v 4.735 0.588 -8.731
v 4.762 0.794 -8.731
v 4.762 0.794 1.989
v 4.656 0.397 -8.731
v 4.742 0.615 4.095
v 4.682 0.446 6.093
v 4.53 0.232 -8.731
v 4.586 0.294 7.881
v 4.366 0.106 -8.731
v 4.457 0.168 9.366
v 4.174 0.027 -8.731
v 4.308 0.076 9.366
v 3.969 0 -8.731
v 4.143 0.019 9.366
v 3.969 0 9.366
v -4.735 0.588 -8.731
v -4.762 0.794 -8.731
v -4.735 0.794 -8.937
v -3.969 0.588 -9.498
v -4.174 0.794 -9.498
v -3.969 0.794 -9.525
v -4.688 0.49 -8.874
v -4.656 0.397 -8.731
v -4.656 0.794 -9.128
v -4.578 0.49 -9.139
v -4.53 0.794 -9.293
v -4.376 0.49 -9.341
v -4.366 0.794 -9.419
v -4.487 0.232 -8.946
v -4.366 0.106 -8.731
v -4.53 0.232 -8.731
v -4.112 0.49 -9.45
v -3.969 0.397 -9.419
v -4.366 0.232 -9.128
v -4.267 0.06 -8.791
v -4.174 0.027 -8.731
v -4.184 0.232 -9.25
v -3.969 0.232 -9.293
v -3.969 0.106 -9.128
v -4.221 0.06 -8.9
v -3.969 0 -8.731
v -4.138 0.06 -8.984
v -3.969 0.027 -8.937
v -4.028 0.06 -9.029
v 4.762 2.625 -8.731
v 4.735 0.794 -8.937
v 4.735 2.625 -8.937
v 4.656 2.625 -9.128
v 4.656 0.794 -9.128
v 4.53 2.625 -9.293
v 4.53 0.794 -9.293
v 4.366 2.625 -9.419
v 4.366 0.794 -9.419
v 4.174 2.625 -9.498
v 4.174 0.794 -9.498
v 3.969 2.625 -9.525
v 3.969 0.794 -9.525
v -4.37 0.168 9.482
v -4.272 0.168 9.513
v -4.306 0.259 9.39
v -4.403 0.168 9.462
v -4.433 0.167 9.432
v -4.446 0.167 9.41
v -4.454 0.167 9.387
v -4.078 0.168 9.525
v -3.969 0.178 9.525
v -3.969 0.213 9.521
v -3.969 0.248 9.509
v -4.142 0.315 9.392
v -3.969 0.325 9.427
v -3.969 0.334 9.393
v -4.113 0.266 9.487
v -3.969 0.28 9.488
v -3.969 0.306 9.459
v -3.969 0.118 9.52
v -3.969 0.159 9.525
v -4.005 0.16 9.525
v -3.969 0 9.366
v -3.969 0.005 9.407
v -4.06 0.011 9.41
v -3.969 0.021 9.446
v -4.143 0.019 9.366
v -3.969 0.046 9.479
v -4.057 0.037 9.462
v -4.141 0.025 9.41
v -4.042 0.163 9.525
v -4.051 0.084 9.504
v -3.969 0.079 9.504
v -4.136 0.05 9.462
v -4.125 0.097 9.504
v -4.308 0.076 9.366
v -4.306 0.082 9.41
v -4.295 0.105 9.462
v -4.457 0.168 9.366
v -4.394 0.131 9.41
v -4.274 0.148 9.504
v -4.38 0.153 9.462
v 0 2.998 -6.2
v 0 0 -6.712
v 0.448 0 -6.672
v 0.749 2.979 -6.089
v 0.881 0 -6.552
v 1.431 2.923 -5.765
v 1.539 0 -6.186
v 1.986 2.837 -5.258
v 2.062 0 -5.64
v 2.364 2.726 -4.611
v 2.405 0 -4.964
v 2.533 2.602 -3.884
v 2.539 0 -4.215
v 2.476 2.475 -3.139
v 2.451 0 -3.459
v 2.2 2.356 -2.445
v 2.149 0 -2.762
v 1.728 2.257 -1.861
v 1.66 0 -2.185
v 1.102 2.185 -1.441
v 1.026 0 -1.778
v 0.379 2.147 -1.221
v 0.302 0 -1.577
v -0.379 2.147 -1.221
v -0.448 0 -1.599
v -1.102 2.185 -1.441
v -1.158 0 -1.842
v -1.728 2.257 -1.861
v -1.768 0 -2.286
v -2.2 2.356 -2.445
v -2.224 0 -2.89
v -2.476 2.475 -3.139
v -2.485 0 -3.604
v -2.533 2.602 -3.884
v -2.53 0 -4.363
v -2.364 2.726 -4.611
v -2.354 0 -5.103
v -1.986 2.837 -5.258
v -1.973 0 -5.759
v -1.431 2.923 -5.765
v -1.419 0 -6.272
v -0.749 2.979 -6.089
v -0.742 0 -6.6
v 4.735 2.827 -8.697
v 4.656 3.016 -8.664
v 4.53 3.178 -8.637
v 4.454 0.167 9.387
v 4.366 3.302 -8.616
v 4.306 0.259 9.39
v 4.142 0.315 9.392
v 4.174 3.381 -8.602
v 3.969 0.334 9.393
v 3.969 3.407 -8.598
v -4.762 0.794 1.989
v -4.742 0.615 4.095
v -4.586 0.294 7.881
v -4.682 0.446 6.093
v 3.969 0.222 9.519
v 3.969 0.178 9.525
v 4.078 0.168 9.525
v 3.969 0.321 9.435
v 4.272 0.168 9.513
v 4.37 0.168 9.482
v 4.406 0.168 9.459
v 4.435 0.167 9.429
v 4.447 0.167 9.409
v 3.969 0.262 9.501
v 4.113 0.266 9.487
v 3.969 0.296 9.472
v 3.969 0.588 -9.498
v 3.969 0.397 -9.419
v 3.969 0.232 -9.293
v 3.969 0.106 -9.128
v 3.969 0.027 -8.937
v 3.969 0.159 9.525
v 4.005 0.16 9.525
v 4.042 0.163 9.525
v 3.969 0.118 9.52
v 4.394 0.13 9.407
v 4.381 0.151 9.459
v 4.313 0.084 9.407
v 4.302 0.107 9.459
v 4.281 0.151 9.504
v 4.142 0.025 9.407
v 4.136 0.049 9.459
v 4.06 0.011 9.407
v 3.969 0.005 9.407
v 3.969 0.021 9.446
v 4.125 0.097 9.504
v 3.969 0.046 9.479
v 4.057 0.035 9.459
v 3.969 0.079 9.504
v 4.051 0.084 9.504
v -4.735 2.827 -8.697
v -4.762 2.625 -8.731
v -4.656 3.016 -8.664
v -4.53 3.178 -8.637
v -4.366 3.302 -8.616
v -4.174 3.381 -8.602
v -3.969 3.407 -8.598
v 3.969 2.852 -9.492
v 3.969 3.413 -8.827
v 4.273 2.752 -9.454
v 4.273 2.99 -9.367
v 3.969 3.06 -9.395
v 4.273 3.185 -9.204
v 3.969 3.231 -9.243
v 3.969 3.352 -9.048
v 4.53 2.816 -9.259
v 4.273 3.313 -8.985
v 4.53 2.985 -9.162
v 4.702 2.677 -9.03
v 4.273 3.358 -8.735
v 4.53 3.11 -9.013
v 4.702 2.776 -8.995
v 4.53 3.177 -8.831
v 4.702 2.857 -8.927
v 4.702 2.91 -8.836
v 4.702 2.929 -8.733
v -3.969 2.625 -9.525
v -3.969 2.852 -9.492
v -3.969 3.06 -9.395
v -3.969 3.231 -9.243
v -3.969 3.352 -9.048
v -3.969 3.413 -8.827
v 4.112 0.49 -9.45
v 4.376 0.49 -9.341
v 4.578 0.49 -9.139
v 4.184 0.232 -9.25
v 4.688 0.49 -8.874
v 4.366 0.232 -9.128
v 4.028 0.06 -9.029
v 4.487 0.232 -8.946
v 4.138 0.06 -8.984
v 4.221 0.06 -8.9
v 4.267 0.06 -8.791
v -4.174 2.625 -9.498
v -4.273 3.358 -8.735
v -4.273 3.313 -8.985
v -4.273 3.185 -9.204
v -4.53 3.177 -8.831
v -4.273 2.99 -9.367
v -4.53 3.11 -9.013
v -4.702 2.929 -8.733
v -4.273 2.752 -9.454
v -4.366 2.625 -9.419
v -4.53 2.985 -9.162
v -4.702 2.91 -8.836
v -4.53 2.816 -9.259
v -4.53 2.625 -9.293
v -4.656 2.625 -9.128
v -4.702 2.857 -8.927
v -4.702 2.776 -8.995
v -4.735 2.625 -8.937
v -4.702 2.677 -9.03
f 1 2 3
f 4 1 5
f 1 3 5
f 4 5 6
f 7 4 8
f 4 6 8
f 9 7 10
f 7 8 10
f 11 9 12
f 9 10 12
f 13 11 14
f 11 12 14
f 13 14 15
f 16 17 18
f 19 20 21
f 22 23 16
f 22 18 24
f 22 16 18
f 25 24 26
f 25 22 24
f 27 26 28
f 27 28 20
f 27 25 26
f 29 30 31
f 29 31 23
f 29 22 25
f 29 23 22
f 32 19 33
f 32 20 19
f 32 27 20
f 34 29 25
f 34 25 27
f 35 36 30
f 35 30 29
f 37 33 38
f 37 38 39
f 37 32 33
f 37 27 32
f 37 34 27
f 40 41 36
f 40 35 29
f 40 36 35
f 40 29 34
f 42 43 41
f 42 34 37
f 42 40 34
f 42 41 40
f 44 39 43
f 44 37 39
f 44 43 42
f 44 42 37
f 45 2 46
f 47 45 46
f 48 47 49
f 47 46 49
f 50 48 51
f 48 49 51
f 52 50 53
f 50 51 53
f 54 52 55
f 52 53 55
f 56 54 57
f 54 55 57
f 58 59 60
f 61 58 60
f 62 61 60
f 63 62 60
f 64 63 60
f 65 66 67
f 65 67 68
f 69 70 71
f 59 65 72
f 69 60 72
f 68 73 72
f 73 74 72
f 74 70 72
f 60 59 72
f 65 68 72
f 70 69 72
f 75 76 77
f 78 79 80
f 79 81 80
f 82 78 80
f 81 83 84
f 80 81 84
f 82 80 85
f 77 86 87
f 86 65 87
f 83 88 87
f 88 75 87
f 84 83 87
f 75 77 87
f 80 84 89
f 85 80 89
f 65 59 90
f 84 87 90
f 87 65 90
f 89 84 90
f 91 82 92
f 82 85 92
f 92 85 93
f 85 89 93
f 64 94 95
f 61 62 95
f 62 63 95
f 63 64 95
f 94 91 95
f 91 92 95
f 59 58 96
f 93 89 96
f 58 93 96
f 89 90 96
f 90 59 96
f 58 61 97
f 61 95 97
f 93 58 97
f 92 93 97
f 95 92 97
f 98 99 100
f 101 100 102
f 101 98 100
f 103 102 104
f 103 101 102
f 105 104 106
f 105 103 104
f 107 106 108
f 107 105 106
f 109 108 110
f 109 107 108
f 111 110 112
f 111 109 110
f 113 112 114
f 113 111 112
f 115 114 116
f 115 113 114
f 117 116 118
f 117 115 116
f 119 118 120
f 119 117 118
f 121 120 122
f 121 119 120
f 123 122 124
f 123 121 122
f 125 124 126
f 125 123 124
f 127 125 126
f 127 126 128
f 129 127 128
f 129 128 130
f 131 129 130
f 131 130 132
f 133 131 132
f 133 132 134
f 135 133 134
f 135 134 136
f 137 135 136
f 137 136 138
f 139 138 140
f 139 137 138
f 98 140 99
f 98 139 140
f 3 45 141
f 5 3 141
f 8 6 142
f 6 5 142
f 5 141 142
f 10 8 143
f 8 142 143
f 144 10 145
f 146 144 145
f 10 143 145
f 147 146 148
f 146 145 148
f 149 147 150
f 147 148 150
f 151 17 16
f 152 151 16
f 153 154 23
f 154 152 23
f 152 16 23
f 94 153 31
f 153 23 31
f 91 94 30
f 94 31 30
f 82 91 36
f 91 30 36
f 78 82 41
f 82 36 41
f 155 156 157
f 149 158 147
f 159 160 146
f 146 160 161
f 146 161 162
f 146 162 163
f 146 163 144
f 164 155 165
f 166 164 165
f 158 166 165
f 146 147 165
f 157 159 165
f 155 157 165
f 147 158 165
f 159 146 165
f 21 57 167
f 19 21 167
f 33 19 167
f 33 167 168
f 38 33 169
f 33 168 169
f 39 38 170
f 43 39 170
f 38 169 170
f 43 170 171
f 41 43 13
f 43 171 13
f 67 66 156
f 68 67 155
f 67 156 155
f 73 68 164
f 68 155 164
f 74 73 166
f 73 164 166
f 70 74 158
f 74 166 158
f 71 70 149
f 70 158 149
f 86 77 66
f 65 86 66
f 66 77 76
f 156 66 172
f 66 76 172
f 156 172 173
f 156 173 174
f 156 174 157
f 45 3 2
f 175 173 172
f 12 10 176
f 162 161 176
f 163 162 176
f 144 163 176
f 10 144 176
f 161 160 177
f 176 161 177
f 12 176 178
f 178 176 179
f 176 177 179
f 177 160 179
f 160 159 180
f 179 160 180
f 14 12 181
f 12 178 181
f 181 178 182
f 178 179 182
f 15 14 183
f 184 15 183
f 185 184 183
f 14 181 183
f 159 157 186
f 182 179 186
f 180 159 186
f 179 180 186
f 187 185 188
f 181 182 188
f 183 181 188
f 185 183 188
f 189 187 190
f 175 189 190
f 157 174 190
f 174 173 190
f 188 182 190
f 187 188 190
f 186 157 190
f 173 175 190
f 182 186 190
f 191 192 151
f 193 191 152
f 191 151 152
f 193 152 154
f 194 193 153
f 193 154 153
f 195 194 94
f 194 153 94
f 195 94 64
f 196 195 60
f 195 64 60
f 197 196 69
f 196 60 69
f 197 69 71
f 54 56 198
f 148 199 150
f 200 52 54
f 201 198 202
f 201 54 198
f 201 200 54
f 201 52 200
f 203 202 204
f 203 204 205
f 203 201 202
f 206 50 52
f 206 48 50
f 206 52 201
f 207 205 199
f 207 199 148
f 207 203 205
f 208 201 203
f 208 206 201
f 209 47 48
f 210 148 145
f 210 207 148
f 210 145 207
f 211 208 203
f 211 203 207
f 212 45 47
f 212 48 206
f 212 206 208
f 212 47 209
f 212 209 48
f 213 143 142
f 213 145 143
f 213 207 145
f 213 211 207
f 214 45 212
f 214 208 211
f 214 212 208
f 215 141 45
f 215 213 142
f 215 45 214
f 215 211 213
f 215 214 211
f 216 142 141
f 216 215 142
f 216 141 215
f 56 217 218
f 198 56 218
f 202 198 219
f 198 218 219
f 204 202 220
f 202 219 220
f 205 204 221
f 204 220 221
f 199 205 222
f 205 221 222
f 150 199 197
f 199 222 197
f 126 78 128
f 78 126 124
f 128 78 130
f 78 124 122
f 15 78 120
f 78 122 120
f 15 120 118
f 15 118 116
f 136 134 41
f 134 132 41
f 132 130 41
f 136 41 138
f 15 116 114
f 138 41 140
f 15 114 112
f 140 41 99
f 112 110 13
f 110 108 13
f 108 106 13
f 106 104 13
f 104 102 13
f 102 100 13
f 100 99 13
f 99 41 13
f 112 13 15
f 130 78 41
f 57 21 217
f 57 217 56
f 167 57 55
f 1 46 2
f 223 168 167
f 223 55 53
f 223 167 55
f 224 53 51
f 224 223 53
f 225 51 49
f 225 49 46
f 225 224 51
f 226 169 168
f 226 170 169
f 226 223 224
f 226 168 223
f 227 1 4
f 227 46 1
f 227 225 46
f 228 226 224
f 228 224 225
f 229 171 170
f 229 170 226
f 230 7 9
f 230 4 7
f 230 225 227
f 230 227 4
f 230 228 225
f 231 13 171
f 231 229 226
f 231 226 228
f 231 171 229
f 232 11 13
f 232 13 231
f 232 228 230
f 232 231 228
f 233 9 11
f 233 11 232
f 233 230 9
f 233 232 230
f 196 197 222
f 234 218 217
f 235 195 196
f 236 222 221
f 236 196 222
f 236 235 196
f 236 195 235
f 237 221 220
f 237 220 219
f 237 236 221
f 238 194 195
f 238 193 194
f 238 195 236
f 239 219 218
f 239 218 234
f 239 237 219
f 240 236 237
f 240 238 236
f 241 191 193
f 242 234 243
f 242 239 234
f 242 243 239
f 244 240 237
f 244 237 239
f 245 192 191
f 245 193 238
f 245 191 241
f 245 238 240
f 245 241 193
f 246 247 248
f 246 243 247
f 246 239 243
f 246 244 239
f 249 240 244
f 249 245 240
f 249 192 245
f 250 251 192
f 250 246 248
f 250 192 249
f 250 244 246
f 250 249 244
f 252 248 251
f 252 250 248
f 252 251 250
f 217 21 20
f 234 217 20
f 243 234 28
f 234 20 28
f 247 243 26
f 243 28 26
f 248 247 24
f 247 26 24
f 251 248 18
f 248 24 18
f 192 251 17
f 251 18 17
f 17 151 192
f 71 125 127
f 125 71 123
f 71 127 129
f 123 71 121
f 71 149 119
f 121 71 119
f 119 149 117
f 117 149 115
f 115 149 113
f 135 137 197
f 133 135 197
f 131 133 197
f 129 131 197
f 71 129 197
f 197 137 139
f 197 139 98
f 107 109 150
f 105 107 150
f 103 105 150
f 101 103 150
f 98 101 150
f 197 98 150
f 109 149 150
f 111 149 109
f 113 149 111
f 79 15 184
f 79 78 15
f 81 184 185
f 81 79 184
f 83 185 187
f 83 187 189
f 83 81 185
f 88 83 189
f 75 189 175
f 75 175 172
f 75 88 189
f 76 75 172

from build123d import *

# Parameters (mm, degrees)
SKETCH1_W               = 9.525
SKETCH1_H               = 19.05
BOSS_EXTRUDE1_DEPTH     = 6.35
CUT_EXTRUDE4_DEPTH      = 15.892070037
CUT_EXTRUDE4_DEPTH_BACK = 15.892070037
CUT_EXTRUDE6_DEPTH      = 11.962309672
CUT_EXTRUDE6_DEPTH_BACK = 11.962309672
SKETCH7_R               = 2.54
FILLET2_R               = 0.79375
FILLET3_R               = 0.15875


with BuildPart() as part:
    # Sketch1 → Boss-Extrude1 (new body)
    with BuildSketch(Plane(origin=(0, 0, 0), x_dir=(1, 0, 0), z_dir=(0, 1, 0))):
        Rectangle(SKETCH1_W, SKETCH1_H)
    extrude(amount=BOSS_EXTRUDE1_DEPTH)

    # Sketch4 → Cut-Extrude4 (cut, two sides: drawn at the far end of the back side and taken through both)
    with BuildSketch(Plane.ZY.offset(4.7625).offset(-CUT_EXTRUDE4_DEPTH_BACK)):
        Polygon((9.525, 0.311917294), (-9.525, 3.56560647), (-9.525, 6.35), (9.525, 6.35), align=None)
    extrude(amount=CUT_EXTRUDE4_DEPTH + CUT_EXTRUDE4_DEPTH_BACK, mode=Mode.SUBTRACT)

    # Sketch7 → Cut-Extrude6 (cut, two sides: drawn at the far end of the back side and taken through both)
    with BuildSketch(Plane(origin=(0, 1.911087398, 0.162031127), x_dir=(1, 0, 0), z_dir=(0, -0.9857256920245803, -0.16835931837193446)).offset(-CUT_EXTRUDE6_DEPTH_BACK)):
        with Locations(Location((0, -3.914374553, 0), (0, 0, 270))):
            Circle(SKETCH7_R)
    extrude(amount=CUT_EXTRUDE6_DEPTH + CUT_EXTRUDE6_DEPTH_BACK, mode=Mode.SUBTRACT)

    # Fillet2
    # the kernel refuses this fillet: 0.79375 mm, written as the material it takes off along each edge
    with BuildSketch(Plane(origin=(3.96875, 0.79375, -8.73125), x_dir=(1, 0, 0), z_dir=(0, -1, 0))) as fillet2_piece_1_section:
        Polygon((0, 0), (FILLET2_R, 0), (FILLET2_R, -FILLET2_R), (0, -FILLET2_R), align=None)
    fillet2_piece_1 = extrude(amount=FILLET2_R, mode=Mode.PRIVATE)
    fillet2_piece_1 = fillet2_piece_1 - Plane(origin=(3.96875, 0.79375, -8.73125), x_dir=(-0.7071067811865475, 0, 0.7071067811865475), z_dir=(0, -1, 0)) * Sphere(FILLET2_R, mode=Mode.PRIVATE)
    add(fillet2_piece_1, mode=Mode.SUBTRACT)
    with BuildSketch(Plane(origin=(3.96875, 2.624791783, -8.73125), x_dir=(0, 0.9857256920245803, 0.16835931837193446), z_dir=(1, 0, 0))) as fillet2_piece_2_section:
        Polygon((0, 0), (FILLET2_R, 0), (FILLET2_R, -FILLET2_R * 1.18527834653), (-FILLET2_R * 0.168359318372, -FILLET2_R * 0.985725692025), align=None)
    fillet2_piece_2 = extrude(amount=FILLET2_R, mode=Mode.PRIVATE)
    fillet2_piece_2 = fillet2_piece_2 - Plane(origin=(3.96875, 2.624791783, -8.73125), x_dir=(0, -0.7643164653374722, 0.6448413299518206), z_dir=(1, 0, 0)) * Sphere(FILLET2_R, mode=Mode.PRIVATE)
    add(fillet2_piece_2, mode=Mode.SUBTRACT)
    with BuildSketch(Plane(origin=(-3.96875, 0.79375, -8.73125), x_dir=(-1, 0, 0), z_dir=(0, -1, 0))) as fillet2_piece_3_section:
        Polygon((0, 0), (FILLET2_R, 0), (FILLET2_R, FILLET2_R), (0, FILLET2_R), align=None)
    fillet2_piece_3 = extrude(amount=FILLET2_R, mode=Mode.PRIVATE)
    fillet2_piece_3 = fillet2_piece_3 - Plane(origin=(-3.96875, 0.79375, -8.73125), x_dir=(0.7071067811865475, 0, 0.7071067811865475), z_dir=(0, -1, 0)) * Sphere(FILLET2_R, mode=Mode.PRIVATE)
    add(fillet2_piece_3, mode=Mode.SUBTRACT)
    with BuildSketch(Plane(origin=(-3.96875, 2.624791783, -8.73125), x_dir=(0, 0, -1), z_dir=(-1, 0, 0))) as fillet2_piece_4_section:
        Polygon((0, 0), (FILLET2_R, 0), (FILLET2_R, -FILLET2_R * 1.18527834653), (-FILLET2_R * 0.168359318372, -FILLET2_R * 0.985725692025), align=None)
    fillet2_piece_4 = extrude(amount=FILLET2_R, mode=Mode.PRIVATE)
    fillet2_piece_4 = fillet2_piece_4 - Plane(origin=(-3.96875, 2.624791783, -8.73125), x_dir=(0, -0.7643164653374722, 0.6448413299518206), z_dir=(-1, 0, 0)) * Sphere(FILLET2_R, mode=Mode.PRIVATE)
    add(fillet2_piece_4, mode=Mode.SUBTRACT)
    with BuildSketch(Plane(origin=(4.7625, 0, 11.509375), x_dir=(-1, 0, 0), z_dir=(0, 0, -1)), Plane(origin=(-4.7625, 0, -8.73125), x_dir=(1, 0, 0), z_dir=(0, 0, 1))) as fillet2_piece_5:
        with BuildLine():
            CenterArc((FILLET2_R, FILLET2_R), FILLET2_R, 180, 90)
            Line((0, FILLET2_R), (0, 0))
            Line((0, 0), (FILLET2_R, 0))
        make_face()
    extrude(amount=20.240625, mode=Mode.SUBTRACT)
    with BuildSketch(Plane(origin=(4.7625, 3.407211551, -8.597614791), x_dir=(0, -0.9857256920245803, -0.16835931837193446), z_dir=(0, -0.16835931837193446, 0.9857256920245803))) as fillet2_piece_6:
        with BuildLine():
            CenterArc((FILLET2_R, -FILLET2_R), FILLET2_R, 90, 90)
            Line((0, -FILLET2_R), (0, 0))
            Line((0, 0), (FILLET2_R, 0))
        make_face()
    extrude(amount=20.369423637, mode=Mode.SUBTRACT)
    with BuildSketch(Plane(origin=(3.96875, 0, -9.525), x_dir=(0, 0, 1), z_dir=(-1, 0, 0))) as fillet2_piece_7:
        with BuildLine():
            CenterArc((FILLET2_R, FILLET2_R), FILLET2_R, 180, 90)
            Line((0, FILLET2_R), (0, 0))
            Line((0, 0), (FILLET2_R, 0))
        make_face()
    extrude(amount=7.9375, mode=Mode.SUBTRACT)
    with BuildSketch(Plane(origin=(4.7625, 0.79375, -9.525), x_dir=(0, 0, 1), z_dir=(0, 1, 0))) as fillet2_piece_8:
        with BuildLine():
            CenterArc((FILLET2_R, -FILLET2_R), FILLET2_R, 90, 90)
            Line((0, -FILLET2_R), (0, 0))
            Line((0, 0), (FILLET2_R, 0))
        make_face()
    extrude(amount=1.831041783, mode=Mode.SUBTRACT)
    with BuildSketch(Plane(origin=(-3.96875, 3.56560647, -9.525), x_dir=(0, -0.16835931837193435, 0.9857256920245803), z_dir=(1, 0, 0))) as fillet2_piece_9:
        with BuildLine():
            CenterArc((FILLET2_R * 1.18527834653, FILLET2_R), FILLET2_R, 170.307559955, 99.692440045)
            Line((FILLET2_R * 0.199552654502, FILLET2_R * 1.16835931837), (0, 0))
            Line((0, 0), (FILLET2_R * 1.18527834653, 0))
        make_face()
    extrude(amount=7.9375, mode=Mode.SUBTRACT)
    with BuildSketch(Plane(origin=(-4.7625, 0.79375, -9.525), x_dir=(0, 0, 1), z_dir=(0, 1, 0))) as fillet2_piece_10:
        with BuildLine():
            CenterArc((FILLET2_R, FILLET2_R), FILLET2_R, 180, 90)
            Line((0, FILLET2_R), (0, 0))
            Line((0, 0), (FILLET2_R, 0))
        make_face()
    extrude(amount=1.831041783, mode=Mode.SUBTRACT)
    with BuildSketch(Plane(origin=(-4.7625, -0.022170729, 11.48104942), x_dir=(1, 0, 0), z_dir=(0, 0.16835931837193446, -0.9857256920245803))) as fillet2_piece_11:
        with BuildLine():
            CenterArc((FILLET2_R, FILLET2_R), FILLET2_R, 180, 90)
            Line((0, FILLET2_R), (0, 0))
            Line((0, 0), (FILLET2_R, 0))
        make_face()
    extrude(amount=20.369423637, mode=Mode.SUBTRACT)

    # Fillet3
    fillet3_edges = [part.edges().sort_by_distance(p)[0] for p in [
        (-4.216643426, 0.039702314, 9.525),
        (4.216643426, 0.039702314, 9.525),
        (4.216960585, 0.271534198, 9.525),
        (-4.216960585, 0.271534198, 9.525),
        (0, 0, 9.525),
        (0, 0.311917294, 9.525),
    ]]
    fillet(fillet3_edges, radius=FILLET3_R)


solid = part.part
